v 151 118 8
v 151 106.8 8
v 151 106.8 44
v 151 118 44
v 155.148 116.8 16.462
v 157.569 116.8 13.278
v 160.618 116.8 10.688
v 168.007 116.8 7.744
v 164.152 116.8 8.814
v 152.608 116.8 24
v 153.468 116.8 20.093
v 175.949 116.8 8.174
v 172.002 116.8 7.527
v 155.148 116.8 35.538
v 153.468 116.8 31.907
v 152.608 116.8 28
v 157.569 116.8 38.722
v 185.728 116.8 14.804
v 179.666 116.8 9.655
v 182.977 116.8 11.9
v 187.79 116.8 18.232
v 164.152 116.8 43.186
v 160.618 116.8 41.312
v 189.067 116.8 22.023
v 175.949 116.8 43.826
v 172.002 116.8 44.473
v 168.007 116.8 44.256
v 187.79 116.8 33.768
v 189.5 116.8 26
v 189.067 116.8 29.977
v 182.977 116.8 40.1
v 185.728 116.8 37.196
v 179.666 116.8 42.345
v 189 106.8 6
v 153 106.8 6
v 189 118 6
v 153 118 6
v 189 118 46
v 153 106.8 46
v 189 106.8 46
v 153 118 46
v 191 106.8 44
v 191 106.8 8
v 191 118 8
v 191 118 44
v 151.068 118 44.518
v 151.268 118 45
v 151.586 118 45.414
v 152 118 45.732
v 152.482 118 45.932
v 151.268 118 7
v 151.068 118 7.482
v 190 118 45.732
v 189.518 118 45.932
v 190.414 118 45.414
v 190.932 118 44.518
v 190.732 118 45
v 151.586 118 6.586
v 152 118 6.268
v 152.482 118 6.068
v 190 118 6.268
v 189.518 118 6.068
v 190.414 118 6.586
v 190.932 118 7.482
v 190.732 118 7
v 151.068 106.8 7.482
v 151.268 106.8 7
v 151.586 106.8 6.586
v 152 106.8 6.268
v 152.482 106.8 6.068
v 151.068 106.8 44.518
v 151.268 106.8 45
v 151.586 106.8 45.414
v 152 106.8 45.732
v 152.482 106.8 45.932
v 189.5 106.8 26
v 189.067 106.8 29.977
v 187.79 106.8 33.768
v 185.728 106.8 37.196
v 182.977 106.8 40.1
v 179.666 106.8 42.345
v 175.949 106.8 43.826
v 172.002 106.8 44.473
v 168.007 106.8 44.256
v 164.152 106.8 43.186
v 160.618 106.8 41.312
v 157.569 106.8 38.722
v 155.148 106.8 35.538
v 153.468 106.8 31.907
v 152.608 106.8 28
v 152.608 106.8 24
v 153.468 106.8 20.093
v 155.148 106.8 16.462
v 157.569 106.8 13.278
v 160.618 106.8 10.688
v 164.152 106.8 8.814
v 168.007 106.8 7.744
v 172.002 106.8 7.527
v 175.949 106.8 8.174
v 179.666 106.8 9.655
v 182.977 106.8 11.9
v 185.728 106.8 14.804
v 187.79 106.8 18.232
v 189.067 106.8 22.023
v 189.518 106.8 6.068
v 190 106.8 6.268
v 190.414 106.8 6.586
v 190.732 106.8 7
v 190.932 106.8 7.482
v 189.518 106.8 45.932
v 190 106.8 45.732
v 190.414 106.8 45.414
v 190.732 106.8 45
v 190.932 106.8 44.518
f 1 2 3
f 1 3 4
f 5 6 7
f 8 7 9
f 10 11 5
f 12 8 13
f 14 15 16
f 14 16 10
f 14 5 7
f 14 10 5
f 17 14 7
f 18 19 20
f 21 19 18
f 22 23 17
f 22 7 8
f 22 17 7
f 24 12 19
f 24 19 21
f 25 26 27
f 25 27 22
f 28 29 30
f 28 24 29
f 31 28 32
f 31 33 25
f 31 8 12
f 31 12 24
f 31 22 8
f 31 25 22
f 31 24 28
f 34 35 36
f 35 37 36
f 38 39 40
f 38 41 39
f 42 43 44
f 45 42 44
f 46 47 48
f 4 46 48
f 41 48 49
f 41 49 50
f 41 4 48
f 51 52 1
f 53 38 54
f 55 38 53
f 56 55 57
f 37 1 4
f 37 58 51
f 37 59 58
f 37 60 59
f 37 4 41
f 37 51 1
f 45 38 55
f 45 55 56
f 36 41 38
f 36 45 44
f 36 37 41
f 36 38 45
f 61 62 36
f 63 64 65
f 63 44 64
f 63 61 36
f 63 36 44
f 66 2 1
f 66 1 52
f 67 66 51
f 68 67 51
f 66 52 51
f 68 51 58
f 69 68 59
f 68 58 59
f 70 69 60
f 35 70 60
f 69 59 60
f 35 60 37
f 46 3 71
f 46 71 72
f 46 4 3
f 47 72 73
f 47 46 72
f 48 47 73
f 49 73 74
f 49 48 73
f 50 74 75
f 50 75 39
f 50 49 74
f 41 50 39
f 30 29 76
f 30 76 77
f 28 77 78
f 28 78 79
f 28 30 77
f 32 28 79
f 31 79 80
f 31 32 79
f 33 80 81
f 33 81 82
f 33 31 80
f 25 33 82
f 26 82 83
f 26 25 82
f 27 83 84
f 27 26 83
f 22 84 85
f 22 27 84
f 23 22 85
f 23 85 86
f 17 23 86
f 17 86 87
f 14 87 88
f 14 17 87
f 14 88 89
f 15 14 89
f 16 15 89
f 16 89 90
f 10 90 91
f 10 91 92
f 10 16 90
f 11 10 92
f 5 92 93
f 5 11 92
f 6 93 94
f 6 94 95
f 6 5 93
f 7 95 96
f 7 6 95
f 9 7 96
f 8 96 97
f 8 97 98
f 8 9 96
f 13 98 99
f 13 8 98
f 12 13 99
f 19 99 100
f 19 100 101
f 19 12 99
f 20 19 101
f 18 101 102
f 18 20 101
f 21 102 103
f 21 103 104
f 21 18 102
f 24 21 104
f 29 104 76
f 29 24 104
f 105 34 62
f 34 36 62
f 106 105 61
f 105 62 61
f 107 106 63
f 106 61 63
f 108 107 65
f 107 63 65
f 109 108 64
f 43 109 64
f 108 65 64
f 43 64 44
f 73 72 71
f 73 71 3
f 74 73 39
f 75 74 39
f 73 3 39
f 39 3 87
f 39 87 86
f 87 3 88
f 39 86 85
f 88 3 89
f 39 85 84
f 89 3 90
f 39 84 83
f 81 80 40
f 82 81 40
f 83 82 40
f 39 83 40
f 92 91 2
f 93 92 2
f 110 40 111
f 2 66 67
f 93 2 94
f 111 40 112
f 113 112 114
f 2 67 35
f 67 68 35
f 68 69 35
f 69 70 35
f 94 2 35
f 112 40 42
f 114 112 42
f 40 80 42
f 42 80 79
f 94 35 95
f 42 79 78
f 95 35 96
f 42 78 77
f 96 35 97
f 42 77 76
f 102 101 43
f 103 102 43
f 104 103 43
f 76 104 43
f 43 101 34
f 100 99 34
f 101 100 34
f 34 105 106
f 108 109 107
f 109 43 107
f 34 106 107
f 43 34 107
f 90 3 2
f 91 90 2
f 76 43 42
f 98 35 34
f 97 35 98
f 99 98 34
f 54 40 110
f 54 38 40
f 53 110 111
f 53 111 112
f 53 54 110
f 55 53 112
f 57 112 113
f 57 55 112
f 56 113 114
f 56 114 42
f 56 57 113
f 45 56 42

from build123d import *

# Parameters (mm, degrees)
CYLINDER057_R        = 18.5
CYLINDER057_DEPTH    = 10
BOX085108_W          = 40
BOX085108_H          = 11.2
BOX085108_DEPTH      = 40
FILLET005011017060_R = 2


with BuildPart() as cylinder057:
    # Cylinder057 → Cylinder057 (new body)
    with BuildSketch(Plane(origin=(20, 10, 20), x_dir=(1, 0, 0), z_dir=(0, -1, 0))):
        Circle(CYLINDER057_R)
    extrude(amount=CYLINDER057_DEPTH)


with BuildPart() as f_40mm_fan:
    # Box085108 → Box085108 (new body)
    with BuildSketch(Plane.XY):
        with Locations((20, 5.6)):
            Rectangle(BOX085108_W, BOX085108_H)
    extrude(amount=BOX085108_DEPTH)

    # Cut001002016030: cut Cylinder057
    add(cylinder057.part, mode=Mode.SUBTRACT)

    # Fillet005011017060
    fillet005011017060_edges = [f_40mm_fan.edges().sort_by_distance(p)[0] for p in [
        (0, 5.6, 40),
        (0, 5.6, 0),
        (40, 5.6, 40),
        (40, 5.6, 0),
    ]]
    fillet(fillet005011017060_edges, radius=FILLET005011017060_R)


with BuildPart() as f_40mm_fan_1:
    # Fillet005011017060 placement: moved
    add(f_40mm_fan.part.moved(Location((151, 106.8, 6))))


solid = f_40mm_fan_1.part
